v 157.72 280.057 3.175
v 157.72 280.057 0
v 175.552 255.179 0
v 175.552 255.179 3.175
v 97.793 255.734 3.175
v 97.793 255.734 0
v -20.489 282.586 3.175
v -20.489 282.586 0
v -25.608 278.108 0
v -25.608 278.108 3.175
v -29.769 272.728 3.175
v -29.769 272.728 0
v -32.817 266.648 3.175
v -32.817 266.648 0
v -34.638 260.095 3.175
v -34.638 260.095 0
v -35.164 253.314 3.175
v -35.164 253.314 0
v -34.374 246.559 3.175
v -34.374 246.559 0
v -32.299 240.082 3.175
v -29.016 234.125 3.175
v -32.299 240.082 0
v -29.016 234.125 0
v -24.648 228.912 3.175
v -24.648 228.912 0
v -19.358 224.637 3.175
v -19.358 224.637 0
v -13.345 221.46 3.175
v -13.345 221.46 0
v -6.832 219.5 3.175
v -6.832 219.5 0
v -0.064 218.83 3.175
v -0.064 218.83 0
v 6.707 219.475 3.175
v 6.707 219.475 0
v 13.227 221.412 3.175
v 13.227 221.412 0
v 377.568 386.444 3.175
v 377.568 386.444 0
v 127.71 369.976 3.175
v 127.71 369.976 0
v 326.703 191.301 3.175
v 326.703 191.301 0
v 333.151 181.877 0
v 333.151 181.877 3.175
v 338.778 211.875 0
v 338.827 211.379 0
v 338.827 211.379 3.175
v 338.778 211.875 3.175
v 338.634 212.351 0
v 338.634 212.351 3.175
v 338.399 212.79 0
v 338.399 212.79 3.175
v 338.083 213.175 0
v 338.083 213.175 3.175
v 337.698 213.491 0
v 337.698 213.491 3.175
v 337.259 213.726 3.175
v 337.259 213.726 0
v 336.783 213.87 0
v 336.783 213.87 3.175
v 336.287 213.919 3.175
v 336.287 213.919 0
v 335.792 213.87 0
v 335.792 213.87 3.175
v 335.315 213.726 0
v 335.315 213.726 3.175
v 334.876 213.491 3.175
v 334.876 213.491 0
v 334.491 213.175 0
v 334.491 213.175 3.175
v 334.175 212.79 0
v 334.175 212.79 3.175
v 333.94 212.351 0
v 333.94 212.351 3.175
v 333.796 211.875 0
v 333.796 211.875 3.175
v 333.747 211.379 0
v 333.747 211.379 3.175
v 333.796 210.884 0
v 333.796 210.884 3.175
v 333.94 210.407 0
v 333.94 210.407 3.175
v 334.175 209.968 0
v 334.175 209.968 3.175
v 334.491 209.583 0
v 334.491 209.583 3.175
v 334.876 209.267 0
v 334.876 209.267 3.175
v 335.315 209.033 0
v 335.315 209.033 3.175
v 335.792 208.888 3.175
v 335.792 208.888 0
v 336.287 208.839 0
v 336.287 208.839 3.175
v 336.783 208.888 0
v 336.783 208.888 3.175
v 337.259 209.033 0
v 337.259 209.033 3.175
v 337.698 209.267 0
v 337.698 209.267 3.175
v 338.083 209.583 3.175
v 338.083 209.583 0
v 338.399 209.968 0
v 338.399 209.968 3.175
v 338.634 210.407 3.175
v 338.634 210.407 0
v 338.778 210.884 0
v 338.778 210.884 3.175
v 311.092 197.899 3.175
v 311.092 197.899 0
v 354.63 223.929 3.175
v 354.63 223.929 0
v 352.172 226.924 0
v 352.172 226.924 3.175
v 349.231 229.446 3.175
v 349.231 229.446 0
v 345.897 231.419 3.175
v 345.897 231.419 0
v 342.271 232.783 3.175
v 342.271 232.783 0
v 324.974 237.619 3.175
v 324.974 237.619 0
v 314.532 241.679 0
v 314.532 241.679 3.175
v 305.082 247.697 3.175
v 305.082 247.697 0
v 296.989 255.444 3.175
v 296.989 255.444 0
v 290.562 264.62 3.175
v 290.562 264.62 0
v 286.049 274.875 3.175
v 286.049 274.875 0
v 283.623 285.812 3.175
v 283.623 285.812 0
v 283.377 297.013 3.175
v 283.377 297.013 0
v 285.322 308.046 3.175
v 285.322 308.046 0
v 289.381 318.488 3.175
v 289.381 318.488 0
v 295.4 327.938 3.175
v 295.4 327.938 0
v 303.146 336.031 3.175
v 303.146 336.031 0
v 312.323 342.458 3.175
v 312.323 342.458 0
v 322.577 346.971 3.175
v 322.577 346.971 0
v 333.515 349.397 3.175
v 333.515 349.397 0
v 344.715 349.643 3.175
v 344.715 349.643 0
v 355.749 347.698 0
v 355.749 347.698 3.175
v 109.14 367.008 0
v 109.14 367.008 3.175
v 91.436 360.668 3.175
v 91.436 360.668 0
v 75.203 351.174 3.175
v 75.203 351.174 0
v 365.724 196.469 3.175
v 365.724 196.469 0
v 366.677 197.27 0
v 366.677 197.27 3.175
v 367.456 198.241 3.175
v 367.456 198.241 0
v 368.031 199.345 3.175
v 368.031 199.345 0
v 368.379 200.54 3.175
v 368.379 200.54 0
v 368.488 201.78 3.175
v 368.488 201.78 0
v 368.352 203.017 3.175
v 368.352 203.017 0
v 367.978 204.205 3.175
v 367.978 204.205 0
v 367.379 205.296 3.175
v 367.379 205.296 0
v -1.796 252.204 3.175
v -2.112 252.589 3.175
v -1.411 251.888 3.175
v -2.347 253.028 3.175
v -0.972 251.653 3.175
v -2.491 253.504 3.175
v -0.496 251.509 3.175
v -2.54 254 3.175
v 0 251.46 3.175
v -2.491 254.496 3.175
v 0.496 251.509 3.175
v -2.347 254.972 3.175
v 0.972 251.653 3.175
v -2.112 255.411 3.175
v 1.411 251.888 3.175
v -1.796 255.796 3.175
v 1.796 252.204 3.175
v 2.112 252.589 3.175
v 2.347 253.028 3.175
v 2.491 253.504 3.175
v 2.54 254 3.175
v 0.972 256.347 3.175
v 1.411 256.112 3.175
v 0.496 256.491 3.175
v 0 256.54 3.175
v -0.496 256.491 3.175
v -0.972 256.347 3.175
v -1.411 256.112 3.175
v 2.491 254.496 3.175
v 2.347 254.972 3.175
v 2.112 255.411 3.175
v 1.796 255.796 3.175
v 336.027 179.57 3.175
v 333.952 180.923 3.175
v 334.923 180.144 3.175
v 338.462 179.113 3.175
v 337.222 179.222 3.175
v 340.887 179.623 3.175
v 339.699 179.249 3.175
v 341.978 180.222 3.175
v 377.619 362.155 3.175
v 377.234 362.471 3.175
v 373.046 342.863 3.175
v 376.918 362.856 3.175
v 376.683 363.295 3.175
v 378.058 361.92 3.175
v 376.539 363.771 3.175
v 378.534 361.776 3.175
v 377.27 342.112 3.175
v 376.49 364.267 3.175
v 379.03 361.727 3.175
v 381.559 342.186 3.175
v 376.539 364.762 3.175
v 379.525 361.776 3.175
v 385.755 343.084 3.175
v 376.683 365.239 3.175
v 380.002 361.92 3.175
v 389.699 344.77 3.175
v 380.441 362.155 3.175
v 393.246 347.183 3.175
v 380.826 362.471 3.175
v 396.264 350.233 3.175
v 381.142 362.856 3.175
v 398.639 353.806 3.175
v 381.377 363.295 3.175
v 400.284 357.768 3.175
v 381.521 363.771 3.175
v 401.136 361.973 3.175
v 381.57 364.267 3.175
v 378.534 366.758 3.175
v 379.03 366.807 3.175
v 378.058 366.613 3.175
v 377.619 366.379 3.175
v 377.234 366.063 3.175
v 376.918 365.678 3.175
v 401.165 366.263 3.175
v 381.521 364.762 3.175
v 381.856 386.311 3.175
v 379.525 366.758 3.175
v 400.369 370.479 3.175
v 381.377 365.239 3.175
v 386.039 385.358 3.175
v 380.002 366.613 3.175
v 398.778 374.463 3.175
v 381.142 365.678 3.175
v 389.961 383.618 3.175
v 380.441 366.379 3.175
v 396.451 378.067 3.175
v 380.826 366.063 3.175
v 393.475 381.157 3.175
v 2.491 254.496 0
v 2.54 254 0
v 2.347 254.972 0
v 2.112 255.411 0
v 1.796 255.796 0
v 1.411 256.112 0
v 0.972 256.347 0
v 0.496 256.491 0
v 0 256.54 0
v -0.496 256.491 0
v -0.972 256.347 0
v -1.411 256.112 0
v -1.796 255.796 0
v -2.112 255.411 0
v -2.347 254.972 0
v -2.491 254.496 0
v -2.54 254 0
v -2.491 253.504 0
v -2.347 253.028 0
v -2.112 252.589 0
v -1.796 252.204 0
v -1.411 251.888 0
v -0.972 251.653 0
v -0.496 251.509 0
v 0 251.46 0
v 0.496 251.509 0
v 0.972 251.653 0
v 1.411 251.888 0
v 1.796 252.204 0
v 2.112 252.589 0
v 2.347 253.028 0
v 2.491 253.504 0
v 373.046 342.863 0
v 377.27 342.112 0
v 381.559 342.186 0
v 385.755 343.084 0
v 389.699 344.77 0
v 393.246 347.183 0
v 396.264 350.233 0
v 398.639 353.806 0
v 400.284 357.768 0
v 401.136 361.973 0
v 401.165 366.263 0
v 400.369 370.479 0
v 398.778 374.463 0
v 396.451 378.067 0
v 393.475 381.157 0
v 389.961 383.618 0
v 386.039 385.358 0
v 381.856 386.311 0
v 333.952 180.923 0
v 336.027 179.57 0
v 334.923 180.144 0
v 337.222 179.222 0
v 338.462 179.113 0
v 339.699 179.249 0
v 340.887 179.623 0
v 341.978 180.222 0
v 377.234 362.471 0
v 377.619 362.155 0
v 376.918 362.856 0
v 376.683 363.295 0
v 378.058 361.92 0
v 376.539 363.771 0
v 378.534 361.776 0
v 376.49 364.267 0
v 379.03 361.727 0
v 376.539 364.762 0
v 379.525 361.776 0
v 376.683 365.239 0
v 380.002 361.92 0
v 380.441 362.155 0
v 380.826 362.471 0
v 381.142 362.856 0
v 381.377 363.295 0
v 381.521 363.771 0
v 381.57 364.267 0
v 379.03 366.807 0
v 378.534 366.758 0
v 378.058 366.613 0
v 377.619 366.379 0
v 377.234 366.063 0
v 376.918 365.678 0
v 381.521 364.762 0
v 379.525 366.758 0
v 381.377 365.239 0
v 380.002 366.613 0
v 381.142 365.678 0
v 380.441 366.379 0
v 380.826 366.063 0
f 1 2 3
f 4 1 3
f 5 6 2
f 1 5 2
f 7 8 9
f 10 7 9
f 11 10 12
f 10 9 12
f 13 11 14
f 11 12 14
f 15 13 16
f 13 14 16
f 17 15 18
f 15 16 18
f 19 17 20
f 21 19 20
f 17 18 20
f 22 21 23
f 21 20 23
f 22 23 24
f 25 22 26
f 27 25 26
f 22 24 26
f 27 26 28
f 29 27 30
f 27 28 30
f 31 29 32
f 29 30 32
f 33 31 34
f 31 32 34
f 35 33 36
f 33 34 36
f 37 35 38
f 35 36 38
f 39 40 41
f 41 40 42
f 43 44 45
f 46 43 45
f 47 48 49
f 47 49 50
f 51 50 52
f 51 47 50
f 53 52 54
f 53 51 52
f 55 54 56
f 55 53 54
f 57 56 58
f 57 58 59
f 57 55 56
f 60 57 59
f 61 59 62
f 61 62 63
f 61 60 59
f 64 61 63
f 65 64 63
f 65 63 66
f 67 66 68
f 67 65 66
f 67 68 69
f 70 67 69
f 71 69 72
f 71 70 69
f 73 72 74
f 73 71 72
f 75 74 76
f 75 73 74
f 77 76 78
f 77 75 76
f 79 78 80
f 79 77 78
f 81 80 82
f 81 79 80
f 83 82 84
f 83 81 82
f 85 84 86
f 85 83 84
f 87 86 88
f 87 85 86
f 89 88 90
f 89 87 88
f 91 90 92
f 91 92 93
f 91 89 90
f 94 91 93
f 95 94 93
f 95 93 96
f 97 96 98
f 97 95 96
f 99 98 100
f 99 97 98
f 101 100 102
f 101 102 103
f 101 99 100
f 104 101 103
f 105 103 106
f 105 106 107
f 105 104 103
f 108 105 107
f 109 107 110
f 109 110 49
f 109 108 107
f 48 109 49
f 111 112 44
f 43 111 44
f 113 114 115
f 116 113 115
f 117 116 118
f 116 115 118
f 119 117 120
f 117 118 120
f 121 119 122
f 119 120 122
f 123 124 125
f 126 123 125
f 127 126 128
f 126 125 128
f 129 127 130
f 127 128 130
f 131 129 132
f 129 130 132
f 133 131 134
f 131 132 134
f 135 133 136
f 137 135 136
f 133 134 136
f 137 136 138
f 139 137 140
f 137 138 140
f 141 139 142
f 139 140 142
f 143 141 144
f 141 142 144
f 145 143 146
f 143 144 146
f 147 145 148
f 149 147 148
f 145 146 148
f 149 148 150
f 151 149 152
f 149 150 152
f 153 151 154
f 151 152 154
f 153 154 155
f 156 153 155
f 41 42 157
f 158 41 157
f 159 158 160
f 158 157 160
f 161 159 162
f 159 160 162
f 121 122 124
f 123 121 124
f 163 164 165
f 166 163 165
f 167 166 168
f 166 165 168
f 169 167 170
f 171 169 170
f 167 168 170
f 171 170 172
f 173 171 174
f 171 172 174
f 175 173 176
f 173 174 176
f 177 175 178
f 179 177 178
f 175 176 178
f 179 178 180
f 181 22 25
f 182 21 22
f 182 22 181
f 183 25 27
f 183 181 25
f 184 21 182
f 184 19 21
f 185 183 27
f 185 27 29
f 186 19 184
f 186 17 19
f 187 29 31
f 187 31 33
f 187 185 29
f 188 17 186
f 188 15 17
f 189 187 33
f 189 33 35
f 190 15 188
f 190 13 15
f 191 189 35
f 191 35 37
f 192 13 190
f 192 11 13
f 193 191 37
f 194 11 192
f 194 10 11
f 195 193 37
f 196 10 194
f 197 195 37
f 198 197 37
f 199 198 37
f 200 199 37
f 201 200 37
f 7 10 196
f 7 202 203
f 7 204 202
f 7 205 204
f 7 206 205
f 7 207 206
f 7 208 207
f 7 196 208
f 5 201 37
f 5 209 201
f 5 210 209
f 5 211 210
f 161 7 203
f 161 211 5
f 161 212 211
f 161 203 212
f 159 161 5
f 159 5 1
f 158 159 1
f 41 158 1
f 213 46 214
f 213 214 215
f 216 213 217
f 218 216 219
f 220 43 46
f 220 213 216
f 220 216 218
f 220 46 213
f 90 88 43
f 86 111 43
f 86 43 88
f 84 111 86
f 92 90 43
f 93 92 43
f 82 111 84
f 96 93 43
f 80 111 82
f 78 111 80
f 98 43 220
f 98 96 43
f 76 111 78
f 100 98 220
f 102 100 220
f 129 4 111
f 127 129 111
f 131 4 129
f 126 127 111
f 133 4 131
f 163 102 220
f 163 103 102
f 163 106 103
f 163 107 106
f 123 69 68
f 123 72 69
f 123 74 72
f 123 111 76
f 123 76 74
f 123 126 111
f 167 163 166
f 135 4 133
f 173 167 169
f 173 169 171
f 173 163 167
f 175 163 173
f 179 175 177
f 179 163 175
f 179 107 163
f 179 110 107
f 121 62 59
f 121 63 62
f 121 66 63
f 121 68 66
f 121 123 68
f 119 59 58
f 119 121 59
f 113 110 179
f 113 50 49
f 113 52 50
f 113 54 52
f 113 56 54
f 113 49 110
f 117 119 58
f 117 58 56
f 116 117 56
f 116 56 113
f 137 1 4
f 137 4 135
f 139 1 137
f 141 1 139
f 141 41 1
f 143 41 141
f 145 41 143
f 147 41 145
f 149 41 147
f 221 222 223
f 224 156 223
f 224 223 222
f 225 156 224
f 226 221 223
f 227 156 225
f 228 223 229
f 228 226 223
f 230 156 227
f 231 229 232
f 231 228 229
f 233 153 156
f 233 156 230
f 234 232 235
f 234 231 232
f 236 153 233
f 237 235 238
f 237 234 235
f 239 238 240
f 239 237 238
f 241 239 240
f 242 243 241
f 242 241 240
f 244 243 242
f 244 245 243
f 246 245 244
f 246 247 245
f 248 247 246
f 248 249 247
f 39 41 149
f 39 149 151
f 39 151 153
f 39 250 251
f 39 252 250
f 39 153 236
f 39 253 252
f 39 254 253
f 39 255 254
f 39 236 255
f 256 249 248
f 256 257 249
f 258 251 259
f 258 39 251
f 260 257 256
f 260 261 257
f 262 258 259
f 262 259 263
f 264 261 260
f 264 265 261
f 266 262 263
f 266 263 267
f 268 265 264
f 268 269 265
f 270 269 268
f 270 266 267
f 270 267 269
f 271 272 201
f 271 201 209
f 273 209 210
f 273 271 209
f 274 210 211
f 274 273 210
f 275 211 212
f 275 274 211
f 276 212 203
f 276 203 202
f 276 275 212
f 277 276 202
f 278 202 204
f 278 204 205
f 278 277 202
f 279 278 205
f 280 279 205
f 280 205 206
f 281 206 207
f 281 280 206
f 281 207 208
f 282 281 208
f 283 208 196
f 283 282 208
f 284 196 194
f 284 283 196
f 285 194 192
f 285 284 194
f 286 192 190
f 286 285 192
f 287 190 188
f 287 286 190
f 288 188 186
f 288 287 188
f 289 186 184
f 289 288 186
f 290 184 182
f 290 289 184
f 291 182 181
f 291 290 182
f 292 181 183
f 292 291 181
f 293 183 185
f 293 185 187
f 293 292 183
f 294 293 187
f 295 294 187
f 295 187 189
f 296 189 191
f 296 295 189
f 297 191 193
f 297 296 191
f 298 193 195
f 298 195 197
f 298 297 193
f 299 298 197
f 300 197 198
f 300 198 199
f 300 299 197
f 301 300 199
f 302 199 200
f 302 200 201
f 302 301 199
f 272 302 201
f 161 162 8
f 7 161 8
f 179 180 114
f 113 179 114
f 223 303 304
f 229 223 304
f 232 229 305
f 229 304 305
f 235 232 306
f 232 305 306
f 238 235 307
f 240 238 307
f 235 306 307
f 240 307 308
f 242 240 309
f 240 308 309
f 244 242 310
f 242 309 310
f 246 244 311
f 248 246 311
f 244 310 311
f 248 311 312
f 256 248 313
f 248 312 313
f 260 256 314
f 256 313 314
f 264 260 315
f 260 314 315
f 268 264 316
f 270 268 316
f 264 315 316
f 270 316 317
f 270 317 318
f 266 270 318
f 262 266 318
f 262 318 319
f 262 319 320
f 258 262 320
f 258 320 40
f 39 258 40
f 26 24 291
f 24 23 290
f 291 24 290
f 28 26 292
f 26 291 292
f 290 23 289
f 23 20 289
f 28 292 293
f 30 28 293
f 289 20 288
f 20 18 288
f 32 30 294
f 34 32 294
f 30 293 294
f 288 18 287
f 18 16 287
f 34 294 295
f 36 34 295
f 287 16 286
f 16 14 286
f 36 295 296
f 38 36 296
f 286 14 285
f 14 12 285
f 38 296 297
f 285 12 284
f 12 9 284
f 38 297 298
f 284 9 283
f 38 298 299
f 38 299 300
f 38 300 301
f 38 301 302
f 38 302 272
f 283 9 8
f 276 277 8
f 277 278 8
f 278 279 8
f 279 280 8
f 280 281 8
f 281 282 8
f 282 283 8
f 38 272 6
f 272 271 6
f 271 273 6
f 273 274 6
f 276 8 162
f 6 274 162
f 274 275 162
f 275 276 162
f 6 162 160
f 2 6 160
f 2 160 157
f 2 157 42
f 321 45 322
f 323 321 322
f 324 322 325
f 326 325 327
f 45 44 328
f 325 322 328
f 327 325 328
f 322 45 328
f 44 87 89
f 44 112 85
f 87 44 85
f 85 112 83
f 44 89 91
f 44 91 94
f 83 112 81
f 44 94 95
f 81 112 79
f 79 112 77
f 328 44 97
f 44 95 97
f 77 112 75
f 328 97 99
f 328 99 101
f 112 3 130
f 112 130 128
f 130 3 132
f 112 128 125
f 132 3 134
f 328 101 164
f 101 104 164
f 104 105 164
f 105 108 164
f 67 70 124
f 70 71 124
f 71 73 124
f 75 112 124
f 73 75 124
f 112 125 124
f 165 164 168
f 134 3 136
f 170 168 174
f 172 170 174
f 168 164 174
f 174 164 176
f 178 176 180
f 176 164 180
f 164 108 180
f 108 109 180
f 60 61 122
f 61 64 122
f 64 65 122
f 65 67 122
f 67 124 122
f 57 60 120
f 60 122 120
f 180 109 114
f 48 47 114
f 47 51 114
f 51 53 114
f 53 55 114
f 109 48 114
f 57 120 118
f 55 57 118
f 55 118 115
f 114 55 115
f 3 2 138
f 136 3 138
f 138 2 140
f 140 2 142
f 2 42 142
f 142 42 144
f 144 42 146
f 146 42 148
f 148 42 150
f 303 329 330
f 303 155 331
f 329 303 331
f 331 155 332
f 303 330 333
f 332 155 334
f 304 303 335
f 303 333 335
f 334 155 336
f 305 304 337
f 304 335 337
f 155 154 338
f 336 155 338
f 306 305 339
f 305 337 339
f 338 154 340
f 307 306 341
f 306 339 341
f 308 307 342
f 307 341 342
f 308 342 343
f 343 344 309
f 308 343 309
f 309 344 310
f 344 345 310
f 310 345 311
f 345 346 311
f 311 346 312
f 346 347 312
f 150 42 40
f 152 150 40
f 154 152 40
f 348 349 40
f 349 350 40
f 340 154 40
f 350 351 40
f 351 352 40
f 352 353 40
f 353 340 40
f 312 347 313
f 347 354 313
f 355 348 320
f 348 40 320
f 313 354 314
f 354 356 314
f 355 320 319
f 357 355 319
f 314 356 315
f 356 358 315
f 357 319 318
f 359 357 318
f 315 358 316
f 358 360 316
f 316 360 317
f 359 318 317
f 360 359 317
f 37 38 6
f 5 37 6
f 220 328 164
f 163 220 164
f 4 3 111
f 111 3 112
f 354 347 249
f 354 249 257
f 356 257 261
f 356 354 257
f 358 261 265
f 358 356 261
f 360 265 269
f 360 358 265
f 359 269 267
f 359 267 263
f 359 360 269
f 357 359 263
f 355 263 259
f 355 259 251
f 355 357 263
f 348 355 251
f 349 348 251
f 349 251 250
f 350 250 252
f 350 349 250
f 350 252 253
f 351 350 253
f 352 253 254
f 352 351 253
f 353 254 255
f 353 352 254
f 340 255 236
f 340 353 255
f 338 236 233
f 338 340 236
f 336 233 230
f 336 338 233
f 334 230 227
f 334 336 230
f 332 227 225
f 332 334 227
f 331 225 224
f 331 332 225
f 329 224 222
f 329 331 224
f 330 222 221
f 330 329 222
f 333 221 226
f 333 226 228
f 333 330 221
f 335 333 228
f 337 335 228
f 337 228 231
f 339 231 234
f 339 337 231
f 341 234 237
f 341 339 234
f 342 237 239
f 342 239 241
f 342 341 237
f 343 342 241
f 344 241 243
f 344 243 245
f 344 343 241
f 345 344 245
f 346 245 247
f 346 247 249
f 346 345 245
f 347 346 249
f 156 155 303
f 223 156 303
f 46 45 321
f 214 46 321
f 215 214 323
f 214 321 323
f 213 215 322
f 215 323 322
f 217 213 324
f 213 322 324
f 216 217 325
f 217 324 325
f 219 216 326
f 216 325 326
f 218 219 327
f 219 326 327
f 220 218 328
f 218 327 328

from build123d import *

# Parameters (mm, degrees)
SKETCH1_R           = 2.54
BOSS_EXTRUDE1_DEPTH = 3.175


with BuildPart() as part:
    # Sketch1 → Boss-Extrude1 (new body)
    with BuildSketch(Plane.XY):
        with BuildLine():
            Line((311.091686831, 197.898797126), (326.703198739, 191.301256821))
            Line((326.703198739, 191.301256821), (333.151451498, 181.876980863))
            ThreePointArc((333.151451498, 181.876980863), (337.221932682, 179.221504152), (341.977903119, 180.22206341))
            Line((341.977903119, 180.22206341), (365.723910723, 196.46949289))
            ThreePointArc((365.723910723, 196.46949289), (368.379387434, 200.539974074), (367.378828176, 205.295944512))
            Line((367.378828176, 205.295944512), (354.629507637, 223.929382055))
            ThreePointArc((354.629507637, 223.929382055), (349.230909811, 229.445982169), (342.271098909, 232.783461386))
            Line((342.271098909, 232.783461386), (324.973841412, 237.619253265))
            ThreePointArc((324.973841412, 237.619253265), (285.321700623, 308.046185122), (355.74863248, 347.698325911))
            Line((355.74863248, 347.698325911), (373.045889977, 342.862534033))
            ThreePointArc((373.045889977, 342.862534033), (401.136177569, 361.972870124), (377.568221423, 386.443682241))
            Line((377.568221423, 386.443682241), (127.710075685, 369.975787878))
            ThreePointArc((127.710075685, 369.975787878), (100.141013715, 364.248423846), (75.202698434, 351.174162585))
            Line((75.202698434, 351.174162585), (-20.489180282, 282.58567349))
            ThreePointArc((-20.489180282, 282.58567349), (-30.801832031, 237.023711212), (13.226628142, 221.411604128))
            Line((13.226628142, 221.411604128), (97.792658847, 255.734356495))
            Line((97.792658847, 255.734356495), (157.72015625, 280.057085564))
            Line((157.72015625, 280.057085564), (175.551948383, 255.17889226))
            Line((175.551948383, 255.17889226), (311.091686831, 197.898797126))
        make_face()
        with Locations((379.029877129, 364.266798159)):
            Circle(SKETCH1_R, mode=Mode.SUBTRACT)
        with Locations((336.287111757, 211.37919726)):
            Circle(SKETCH1_R, mode=Mode.SUBTRACT)
        with Locations((0, 254)):
            Circle(SKETCH1_R, mode=Mode.SUBTRACT)
    extrude(amount=BOSS_EXTRUDE1_DEPTH)


solid = part.part
